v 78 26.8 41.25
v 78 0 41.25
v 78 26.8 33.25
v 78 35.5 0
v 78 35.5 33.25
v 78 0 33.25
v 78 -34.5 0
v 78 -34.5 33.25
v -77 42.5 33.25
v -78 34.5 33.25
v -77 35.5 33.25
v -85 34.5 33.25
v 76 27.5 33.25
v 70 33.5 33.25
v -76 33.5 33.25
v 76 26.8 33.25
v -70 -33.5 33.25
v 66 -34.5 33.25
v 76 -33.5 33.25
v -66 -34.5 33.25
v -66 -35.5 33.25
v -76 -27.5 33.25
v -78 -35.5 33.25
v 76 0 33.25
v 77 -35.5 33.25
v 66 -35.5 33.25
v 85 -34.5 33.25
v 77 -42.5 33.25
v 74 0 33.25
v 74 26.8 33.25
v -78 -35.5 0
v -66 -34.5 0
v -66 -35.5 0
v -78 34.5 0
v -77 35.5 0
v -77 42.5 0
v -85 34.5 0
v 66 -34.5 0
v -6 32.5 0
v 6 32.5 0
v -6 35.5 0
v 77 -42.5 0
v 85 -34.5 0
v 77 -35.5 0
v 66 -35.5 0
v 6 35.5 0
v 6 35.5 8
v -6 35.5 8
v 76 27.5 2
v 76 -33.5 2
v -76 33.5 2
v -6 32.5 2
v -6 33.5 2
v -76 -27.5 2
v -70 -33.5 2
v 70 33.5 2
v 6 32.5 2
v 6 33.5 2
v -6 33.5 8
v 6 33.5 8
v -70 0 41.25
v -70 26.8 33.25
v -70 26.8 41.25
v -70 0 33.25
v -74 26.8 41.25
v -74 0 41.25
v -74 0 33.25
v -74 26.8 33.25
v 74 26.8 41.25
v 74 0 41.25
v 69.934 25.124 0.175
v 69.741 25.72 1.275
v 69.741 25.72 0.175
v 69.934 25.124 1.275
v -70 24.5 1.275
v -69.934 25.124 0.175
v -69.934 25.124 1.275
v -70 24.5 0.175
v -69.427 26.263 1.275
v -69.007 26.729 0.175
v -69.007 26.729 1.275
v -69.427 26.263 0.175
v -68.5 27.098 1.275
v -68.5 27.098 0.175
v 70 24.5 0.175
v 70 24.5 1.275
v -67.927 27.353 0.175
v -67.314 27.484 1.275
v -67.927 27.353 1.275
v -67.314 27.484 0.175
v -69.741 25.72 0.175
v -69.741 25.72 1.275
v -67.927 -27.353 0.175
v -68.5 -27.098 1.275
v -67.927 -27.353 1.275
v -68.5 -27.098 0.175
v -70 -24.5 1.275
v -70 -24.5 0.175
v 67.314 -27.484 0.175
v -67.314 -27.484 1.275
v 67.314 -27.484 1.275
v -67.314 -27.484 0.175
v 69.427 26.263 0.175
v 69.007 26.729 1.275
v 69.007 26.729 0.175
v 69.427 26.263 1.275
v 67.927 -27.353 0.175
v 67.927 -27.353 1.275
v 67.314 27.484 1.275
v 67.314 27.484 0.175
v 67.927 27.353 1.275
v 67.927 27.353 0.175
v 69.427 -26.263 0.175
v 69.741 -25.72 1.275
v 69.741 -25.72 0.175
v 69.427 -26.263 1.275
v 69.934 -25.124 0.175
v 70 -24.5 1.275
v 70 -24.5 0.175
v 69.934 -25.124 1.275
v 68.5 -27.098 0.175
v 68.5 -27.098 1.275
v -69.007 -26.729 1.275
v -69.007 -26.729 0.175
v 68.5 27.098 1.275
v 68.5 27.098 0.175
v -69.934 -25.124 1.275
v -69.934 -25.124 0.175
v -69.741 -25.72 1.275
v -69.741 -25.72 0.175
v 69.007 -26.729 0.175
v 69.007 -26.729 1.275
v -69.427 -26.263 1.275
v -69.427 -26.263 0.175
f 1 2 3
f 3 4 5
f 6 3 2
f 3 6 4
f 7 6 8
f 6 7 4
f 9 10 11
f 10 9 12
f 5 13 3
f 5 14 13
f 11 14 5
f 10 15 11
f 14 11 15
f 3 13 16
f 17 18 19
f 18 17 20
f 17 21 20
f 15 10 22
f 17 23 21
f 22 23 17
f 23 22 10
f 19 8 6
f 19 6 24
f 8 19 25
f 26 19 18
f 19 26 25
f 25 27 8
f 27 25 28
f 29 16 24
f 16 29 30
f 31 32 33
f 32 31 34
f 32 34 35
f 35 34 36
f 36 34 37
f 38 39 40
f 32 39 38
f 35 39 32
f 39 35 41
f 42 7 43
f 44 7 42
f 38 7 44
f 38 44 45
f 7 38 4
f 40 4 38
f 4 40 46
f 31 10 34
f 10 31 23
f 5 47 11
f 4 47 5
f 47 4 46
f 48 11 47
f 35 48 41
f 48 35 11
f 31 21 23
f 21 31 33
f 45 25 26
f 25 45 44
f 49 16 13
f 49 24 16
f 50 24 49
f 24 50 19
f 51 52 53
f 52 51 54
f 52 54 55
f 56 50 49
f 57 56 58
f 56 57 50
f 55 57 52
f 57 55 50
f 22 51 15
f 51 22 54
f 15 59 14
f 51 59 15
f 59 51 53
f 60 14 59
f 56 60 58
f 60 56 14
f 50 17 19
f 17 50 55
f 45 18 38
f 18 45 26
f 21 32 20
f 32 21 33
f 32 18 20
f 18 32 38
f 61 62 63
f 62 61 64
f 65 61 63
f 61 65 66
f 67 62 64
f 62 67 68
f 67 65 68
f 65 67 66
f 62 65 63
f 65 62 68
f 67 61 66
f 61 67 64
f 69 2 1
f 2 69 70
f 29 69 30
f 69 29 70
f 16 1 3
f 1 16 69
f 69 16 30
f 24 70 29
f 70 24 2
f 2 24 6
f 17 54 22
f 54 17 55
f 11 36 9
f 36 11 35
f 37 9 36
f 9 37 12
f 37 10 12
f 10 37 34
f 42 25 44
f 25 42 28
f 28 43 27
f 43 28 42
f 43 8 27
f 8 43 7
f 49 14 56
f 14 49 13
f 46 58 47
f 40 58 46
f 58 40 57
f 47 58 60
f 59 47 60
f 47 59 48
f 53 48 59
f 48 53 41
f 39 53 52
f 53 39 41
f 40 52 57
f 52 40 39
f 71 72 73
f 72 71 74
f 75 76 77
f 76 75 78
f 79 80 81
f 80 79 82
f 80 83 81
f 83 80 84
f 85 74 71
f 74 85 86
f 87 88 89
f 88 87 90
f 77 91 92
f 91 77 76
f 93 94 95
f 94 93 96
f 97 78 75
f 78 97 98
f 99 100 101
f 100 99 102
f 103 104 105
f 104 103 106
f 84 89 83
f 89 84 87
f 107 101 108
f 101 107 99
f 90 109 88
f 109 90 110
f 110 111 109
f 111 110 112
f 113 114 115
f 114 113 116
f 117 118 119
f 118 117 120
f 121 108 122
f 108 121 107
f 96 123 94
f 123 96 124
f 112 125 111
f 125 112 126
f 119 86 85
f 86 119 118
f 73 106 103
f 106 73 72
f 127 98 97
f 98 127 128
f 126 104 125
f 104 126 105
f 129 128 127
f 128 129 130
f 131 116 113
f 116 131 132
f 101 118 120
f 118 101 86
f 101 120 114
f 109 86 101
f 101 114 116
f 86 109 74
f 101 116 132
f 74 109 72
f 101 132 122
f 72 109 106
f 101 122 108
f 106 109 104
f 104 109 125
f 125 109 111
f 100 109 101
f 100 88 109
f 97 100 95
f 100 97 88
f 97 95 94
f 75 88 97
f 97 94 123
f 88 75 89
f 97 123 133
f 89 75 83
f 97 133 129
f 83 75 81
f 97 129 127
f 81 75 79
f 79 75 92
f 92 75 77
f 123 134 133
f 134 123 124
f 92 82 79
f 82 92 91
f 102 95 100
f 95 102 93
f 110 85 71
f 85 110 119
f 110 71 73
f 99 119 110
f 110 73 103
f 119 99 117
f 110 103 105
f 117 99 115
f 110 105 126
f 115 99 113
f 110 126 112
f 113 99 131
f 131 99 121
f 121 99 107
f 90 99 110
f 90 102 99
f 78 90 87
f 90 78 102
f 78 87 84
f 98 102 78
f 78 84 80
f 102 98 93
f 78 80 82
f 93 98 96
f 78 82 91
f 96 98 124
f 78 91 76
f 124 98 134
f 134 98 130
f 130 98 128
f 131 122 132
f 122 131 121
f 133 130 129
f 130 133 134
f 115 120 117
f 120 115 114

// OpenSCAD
// =============================================================================
// FestivAir Haven Node — Battery Bay Module
// =============================================================================
// Retaining walls, cable routing channel, and restraint lip for LiFePO4 pack.
// Battery sits on the enclosure floor; this module adds the walls and guides.
// =============================================================================

// Default battery dimensions (overridden by main file parameters)
default_bat_w = 150;
default_bat_d = 65;
default_bat_h = 95;

// Bay parameters
bay_wall          = 2;      // Retaining wall thickness
bay_lip_h         = 8;      // Height of top retaining lip
bay_lip_inset     = 4;      // How far lip overhangs battery
bay_cable_slot_w  = 12;     // Cable routing slot width
bay_cable_slot_h  = 8;      // Cable routing slot height
bay_floor_pad     = 1;      // Anti-vibration pad recess depth

// --------------------------------------------------------------------------
// Battery retaining walls — U-shape (open on one side for cable routing)
// origin = center-bottom of battery footprint
// --------------------------------------------------------------------------
module battery_bay(bat_w = default_bat_w,
                   bat_d = default_bat_d,
                   bat_h = default_bat_h,
                   clearance = 2) {

    inner_w = bat_w + clearance;
    inner_d = bat_d + clearance;
    outer_w = inner_w + bay_wall * 2;
    outer_d = inner_d + bay_wall * 2;
    wall_h  = bat_h * 0.35;  // Walls ~35% of battery height (enough to retain)

    difference() {
        union() {
            // --- U-shaped retaining walls (3 sides) ---
            difference() {
                // Outer block
                translate([0, 0, wall_h/2])
                    cube([outer_w, outer_d, wall_h], center = true);
                // Inner cavity
                translate([0, 0, wall_h/2 + bay_wall])
                    cube([inner_w, inner_d, wall_h], center = true);
                // Open the front face (-Y side) for cable access
                translate([0, -(outer_d/2 + 1), wall_h/2])
                    cube([inner_w - 20, bay_wall + 2, wall_h + 2], center = true);
            }

            // --- Top retaining lips (2 opposing sides, left + right) ---
            for (sx = [-1, 1]) {
                translate([sx * (inner_w/2 - bay_lip_inset/2), 0, wall_h])
                    cube([bay_lip_inset, inner_d * 0.4, bay_lip_h], center = false);
            }

            // --- Corner gussets for strength (4 corners, 45-degree triangles) ---
            gusset = 8;
            for (sx = [-1, 1])
                for (sy = [-1, 1])
                    translate([sx * (inner_w/2 + bay_wall/2),
                               sy * (inner_d/2 + bay_wall/2), 0])
                        rotate([0, 0, (sx > 0 ? (sy > 0 ? 180 : 270) : (sy > 0 ? 90 : 0))])
                            linear_extrude(height = wall_h)
                                polygon([[0, 0], [gusset, 0], [0, gusset]]);
        }

        // --- Cable routing slot through back wall (+Y side) ---
        translate([0, (inner_d/2 + bay_wall/2), bay_cable_slot_h/2])
            cube([bay_cable_slot_w, bay_wall + 2, bay_cable_slot_h], center = true);

        // --- Anti-vibration pad recess in floor ---
        translate([0, 0, -0.1])
            rounded_rect_cutout(bat_w - 10, bat_d - 10, bay_floor_pad + 0.1, r = 3);
    }
}

// --------------------------------------------------------------------------
// Helper: rounded rectangle cutout (for pad recess)
// --------------------------------------------------------------------------
module rounded_rect_cutout(w, d, h, r = 3) {
    translate([0, 0, h/2])
        minkowski() {
            cube([w - 2*r, d - 2*r, h/2], center = true);
            cylinder(r = r, h = h/2, $fn = 30);
        }
}

// --------------------------------------------------------------------------
// Cable guide clip — snap-on cable routing along the floor
// --------------------------------------------------------------------------
module cable_guide(slot_w = 6, slot_h = 4, length = 20) {
    difference() {
        cube([length, slot_w + 4, slot_h + 3], center = true);
        // Channel
        translate([0, 0, 1.5])
            cube([length + 1, slot_w, slot_h], center = true);
        // Entry slot
        translate([0, 0, slot_h/2 + 2])
            cube([length + 1, slot_w * 0.6, slot_h], center = true);
    }
}

// Preview when opened directly
battery_bay();
